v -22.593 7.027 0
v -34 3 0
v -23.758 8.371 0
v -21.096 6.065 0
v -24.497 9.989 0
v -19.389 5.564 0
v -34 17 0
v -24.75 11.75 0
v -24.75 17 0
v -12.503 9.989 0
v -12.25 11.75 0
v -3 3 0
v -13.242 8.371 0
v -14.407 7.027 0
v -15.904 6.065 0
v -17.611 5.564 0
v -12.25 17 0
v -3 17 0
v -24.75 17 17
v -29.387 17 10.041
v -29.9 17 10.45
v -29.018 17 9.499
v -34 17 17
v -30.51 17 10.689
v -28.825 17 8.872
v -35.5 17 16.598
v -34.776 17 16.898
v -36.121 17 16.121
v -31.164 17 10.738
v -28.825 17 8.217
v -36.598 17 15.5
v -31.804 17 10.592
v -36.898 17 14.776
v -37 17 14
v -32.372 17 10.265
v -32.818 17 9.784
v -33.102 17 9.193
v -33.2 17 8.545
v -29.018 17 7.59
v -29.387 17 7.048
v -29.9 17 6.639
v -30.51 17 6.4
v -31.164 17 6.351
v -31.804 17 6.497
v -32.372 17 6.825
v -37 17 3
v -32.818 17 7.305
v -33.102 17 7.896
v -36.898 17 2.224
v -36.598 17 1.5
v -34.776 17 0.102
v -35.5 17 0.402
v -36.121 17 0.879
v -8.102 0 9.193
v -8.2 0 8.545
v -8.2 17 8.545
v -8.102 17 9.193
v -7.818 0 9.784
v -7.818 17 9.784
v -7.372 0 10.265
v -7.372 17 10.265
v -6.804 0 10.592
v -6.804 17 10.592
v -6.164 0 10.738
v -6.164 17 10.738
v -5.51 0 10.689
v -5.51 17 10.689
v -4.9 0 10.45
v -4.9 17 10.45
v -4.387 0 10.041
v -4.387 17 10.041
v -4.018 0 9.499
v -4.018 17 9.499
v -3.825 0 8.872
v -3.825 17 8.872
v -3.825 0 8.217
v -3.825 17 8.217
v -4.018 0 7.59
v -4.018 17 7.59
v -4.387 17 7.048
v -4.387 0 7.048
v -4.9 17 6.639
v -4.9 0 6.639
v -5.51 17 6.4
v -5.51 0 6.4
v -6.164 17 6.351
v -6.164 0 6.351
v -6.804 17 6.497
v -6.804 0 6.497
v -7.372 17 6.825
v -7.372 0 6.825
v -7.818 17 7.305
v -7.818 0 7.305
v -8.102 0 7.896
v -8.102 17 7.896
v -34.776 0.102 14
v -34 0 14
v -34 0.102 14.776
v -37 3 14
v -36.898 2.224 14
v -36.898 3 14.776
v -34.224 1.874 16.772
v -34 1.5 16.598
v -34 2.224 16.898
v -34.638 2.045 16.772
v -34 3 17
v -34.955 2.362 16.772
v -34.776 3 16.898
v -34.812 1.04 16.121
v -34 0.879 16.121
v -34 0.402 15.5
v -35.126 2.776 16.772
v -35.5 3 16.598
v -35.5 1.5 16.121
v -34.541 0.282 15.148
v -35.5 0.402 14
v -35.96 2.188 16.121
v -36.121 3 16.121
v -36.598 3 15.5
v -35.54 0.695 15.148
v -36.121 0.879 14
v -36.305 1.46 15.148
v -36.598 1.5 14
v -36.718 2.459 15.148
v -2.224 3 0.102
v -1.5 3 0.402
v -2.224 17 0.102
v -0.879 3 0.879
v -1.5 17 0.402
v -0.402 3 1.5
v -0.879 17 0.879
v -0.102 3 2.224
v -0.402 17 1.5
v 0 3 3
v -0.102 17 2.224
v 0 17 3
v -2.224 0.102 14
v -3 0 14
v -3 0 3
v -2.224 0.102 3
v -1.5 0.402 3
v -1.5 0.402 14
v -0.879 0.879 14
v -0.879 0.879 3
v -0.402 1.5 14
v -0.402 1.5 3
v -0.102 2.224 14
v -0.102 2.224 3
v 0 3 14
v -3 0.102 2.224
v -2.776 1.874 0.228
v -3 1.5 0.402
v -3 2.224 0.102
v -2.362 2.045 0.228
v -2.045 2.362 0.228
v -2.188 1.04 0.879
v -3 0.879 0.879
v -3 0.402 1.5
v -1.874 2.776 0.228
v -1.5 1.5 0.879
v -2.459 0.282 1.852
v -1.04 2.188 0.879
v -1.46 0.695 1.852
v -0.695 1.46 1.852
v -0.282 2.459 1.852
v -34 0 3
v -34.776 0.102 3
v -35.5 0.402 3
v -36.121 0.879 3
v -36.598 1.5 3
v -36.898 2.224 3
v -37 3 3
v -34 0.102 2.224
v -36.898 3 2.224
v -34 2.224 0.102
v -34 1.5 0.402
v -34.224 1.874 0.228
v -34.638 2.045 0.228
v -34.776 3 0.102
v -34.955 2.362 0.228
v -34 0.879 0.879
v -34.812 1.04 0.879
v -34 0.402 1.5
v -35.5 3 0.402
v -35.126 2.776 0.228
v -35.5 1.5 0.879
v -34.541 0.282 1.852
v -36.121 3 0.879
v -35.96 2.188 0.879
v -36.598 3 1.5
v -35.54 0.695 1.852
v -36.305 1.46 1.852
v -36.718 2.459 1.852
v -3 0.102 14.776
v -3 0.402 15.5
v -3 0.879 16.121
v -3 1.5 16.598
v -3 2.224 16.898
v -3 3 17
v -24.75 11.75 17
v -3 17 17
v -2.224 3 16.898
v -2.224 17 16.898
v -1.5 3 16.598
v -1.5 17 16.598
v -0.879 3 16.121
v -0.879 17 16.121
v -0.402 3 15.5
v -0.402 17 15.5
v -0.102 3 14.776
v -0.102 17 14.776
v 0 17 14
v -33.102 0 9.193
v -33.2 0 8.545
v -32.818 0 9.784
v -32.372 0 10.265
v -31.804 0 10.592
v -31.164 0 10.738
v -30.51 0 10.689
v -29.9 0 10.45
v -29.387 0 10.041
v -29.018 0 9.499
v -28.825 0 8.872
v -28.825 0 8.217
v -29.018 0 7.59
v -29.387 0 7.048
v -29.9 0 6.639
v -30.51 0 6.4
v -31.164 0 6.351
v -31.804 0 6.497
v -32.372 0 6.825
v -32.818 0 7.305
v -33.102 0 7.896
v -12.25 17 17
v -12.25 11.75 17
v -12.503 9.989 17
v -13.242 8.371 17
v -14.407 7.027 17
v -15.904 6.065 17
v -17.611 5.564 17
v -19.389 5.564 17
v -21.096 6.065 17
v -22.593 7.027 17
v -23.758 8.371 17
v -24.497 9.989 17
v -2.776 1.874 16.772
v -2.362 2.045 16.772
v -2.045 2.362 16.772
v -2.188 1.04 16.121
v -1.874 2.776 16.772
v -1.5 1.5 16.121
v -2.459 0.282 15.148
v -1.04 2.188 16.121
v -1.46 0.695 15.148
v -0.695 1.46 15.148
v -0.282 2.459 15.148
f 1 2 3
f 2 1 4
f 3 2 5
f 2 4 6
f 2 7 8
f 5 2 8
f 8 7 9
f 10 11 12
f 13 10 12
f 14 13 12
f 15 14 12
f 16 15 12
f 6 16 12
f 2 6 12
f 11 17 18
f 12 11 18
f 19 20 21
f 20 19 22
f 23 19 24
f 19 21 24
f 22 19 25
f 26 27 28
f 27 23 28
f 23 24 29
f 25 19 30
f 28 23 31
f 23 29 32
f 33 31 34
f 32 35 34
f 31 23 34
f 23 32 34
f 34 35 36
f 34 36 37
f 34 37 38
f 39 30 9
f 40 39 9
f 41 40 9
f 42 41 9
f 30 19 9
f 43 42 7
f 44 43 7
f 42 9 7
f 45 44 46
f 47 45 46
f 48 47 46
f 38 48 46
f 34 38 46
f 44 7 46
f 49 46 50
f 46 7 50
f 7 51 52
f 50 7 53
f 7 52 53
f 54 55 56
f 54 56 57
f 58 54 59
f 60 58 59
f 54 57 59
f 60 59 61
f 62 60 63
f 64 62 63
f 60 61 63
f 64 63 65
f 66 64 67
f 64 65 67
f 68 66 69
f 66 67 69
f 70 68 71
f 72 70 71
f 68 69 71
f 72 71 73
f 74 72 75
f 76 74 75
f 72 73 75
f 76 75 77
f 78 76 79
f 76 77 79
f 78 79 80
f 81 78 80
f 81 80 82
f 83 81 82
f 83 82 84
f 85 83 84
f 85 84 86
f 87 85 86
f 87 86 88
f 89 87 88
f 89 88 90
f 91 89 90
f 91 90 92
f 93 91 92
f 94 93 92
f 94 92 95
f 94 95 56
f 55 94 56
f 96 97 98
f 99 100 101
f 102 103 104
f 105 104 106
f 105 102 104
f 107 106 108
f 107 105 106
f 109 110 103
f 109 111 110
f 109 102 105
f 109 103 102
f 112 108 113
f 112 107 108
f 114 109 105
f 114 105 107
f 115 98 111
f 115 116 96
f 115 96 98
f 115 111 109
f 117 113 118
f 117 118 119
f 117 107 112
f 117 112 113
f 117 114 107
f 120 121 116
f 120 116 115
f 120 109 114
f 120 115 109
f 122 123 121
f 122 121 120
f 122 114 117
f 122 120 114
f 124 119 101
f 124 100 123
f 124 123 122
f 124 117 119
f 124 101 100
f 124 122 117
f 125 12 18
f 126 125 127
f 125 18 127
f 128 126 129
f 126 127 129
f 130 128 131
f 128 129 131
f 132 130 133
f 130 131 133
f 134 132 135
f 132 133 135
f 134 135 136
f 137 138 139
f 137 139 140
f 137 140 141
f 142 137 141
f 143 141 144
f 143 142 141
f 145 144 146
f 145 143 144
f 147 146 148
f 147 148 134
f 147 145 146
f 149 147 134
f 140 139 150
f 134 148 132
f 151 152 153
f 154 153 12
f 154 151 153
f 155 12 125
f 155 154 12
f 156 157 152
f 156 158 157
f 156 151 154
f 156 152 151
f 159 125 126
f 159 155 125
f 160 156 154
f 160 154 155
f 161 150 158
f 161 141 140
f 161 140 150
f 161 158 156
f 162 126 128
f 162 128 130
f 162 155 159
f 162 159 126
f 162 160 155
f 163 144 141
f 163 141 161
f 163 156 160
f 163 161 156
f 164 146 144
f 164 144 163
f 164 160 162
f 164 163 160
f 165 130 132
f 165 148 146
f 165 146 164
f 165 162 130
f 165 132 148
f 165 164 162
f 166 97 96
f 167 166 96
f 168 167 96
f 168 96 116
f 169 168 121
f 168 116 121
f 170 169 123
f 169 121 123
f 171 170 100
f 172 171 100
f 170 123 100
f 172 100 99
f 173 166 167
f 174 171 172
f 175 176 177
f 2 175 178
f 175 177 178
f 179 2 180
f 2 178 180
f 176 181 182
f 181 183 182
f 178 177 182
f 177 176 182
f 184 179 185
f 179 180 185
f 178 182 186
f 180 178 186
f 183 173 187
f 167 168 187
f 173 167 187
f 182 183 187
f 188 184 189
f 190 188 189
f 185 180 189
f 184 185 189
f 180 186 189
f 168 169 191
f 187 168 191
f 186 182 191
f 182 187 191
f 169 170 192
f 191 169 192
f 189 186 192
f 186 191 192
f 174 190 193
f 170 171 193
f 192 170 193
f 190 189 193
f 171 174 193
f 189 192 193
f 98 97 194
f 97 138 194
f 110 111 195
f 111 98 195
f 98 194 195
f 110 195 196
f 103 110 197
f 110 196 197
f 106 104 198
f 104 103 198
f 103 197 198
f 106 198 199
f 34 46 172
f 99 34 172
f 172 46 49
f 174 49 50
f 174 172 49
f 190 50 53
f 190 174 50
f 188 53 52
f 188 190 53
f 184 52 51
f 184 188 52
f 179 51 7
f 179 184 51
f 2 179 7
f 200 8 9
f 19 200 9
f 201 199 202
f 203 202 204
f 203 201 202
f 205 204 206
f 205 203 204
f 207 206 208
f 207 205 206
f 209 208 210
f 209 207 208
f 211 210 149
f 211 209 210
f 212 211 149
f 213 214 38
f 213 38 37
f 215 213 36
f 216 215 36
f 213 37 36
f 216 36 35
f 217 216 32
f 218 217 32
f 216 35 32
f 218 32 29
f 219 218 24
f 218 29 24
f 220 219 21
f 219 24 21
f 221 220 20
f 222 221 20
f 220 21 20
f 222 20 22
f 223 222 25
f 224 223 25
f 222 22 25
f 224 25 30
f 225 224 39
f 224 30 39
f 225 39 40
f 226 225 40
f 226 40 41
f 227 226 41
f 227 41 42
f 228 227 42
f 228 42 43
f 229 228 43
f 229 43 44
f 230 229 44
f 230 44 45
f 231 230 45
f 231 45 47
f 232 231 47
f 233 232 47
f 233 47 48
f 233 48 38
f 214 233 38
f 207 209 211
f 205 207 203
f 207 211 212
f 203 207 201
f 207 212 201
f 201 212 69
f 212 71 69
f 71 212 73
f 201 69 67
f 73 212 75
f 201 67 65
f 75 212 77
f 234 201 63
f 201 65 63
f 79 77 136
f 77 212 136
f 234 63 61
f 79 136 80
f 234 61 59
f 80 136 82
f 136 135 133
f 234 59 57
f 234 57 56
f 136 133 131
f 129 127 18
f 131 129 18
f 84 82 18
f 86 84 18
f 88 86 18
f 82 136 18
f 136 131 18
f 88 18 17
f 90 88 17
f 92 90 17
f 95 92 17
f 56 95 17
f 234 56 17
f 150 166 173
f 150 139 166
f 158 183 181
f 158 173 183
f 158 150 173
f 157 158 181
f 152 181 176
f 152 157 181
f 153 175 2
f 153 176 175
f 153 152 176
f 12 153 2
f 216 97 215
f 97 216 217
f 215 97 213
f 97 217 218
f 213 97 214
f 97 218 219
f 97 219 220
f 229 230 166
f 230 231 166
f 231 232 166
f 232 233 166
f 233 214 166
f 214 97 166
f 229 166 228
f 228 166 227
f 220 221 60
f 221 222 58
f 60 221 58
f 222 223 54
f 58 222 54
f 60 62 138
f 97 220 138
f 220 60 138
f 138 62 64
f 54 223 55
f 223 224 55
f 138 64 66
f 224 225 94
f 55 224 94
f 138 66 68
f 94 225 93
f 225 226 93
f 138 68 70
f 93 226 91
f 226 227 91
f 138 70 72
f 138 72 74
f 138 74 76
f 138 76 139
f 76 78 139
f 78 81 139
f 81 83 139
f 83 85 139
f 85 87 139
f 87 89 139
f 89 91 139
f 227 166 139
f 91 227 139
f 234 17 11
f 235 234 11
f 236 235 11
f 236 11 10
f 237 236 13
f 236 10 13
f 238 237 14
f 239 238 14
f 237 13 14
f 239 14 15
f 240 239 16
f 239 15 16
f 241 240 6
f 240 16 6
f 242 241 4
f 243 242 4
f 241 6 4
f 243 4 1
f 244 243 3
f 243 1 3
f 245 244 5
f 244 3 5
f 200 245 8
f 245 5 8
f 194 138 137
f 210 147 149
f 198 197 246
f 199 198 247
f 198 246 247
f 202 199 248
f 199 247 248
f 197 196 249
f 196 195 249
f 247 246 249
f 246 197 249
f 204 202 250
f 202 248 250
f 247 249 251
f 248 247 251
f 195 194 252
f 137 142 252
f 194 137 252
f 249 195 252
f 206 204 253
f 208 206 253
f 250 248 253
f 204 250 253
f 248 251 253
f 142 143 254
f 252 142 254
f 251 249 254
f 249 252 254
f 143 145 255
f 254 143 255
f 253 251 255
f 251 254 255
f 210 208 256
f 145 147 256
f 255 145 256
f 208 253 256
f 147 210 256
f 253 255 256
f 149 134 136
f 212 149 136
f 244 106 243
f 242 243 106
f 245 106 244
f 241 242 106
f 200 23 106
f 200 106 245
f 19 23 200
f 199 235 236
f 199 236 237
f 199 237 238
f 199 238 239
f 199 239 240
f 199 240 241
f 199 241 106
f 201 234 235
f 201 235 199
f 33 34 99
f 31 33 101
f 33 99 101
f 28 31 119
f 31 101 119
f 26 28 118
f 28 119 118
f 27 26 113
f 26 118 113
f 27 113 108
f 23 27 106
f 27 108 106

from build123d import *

# Parameters (mm, degrees)
F1_DEPTH = 17
F3_D     = 4.4
F4_R     = 3


with BuildPart() as f1:
    # F0 (on Top) → F1 (new body)
    with BuildSketch(Plane.XY):
        with BuildLine():
            Line((-37, 0), (0, 0))
            Line((0, 0), (0, 17))
            Line((0, 17), (-12.25, 17))
            Line((-12.25, 17), (-12.25, 11.75))
            ThreePointArc((-12.25, 11.75), (-18.5, 5.5), (-24.75, 11.75))
            Line((-24.75, 11.75), (-24.75, 17))
            Line((-24.75, 17), (-37, 17))
            Line((-37, 17), (-37, 0))
        make_face()
    extrude(amount=F1_DEPTH)

    # F3 (through all)
    with Locations(Plane.XZ):
        with Locations((-31, 8.5445777363), (-6, 8.5445777363)):
            Hole(F3_D / 2)

    # F4
    f4_edges = [f1.edges().sort_by_distance(p)[0] for p in [
        (-37, 0, 8.5),
        (0, 0, 8.5),
        (-18.5, 0, 17),
        (-18.5, 0, 0),
        (0, 8.5, 17),
        (0, 8.5, 0),
        (-37, 8.5, 17),
        (-37, 8.5, 0),
    ]]
    fillet(f4_edges, radius=F4_R)


solid = f1.part
